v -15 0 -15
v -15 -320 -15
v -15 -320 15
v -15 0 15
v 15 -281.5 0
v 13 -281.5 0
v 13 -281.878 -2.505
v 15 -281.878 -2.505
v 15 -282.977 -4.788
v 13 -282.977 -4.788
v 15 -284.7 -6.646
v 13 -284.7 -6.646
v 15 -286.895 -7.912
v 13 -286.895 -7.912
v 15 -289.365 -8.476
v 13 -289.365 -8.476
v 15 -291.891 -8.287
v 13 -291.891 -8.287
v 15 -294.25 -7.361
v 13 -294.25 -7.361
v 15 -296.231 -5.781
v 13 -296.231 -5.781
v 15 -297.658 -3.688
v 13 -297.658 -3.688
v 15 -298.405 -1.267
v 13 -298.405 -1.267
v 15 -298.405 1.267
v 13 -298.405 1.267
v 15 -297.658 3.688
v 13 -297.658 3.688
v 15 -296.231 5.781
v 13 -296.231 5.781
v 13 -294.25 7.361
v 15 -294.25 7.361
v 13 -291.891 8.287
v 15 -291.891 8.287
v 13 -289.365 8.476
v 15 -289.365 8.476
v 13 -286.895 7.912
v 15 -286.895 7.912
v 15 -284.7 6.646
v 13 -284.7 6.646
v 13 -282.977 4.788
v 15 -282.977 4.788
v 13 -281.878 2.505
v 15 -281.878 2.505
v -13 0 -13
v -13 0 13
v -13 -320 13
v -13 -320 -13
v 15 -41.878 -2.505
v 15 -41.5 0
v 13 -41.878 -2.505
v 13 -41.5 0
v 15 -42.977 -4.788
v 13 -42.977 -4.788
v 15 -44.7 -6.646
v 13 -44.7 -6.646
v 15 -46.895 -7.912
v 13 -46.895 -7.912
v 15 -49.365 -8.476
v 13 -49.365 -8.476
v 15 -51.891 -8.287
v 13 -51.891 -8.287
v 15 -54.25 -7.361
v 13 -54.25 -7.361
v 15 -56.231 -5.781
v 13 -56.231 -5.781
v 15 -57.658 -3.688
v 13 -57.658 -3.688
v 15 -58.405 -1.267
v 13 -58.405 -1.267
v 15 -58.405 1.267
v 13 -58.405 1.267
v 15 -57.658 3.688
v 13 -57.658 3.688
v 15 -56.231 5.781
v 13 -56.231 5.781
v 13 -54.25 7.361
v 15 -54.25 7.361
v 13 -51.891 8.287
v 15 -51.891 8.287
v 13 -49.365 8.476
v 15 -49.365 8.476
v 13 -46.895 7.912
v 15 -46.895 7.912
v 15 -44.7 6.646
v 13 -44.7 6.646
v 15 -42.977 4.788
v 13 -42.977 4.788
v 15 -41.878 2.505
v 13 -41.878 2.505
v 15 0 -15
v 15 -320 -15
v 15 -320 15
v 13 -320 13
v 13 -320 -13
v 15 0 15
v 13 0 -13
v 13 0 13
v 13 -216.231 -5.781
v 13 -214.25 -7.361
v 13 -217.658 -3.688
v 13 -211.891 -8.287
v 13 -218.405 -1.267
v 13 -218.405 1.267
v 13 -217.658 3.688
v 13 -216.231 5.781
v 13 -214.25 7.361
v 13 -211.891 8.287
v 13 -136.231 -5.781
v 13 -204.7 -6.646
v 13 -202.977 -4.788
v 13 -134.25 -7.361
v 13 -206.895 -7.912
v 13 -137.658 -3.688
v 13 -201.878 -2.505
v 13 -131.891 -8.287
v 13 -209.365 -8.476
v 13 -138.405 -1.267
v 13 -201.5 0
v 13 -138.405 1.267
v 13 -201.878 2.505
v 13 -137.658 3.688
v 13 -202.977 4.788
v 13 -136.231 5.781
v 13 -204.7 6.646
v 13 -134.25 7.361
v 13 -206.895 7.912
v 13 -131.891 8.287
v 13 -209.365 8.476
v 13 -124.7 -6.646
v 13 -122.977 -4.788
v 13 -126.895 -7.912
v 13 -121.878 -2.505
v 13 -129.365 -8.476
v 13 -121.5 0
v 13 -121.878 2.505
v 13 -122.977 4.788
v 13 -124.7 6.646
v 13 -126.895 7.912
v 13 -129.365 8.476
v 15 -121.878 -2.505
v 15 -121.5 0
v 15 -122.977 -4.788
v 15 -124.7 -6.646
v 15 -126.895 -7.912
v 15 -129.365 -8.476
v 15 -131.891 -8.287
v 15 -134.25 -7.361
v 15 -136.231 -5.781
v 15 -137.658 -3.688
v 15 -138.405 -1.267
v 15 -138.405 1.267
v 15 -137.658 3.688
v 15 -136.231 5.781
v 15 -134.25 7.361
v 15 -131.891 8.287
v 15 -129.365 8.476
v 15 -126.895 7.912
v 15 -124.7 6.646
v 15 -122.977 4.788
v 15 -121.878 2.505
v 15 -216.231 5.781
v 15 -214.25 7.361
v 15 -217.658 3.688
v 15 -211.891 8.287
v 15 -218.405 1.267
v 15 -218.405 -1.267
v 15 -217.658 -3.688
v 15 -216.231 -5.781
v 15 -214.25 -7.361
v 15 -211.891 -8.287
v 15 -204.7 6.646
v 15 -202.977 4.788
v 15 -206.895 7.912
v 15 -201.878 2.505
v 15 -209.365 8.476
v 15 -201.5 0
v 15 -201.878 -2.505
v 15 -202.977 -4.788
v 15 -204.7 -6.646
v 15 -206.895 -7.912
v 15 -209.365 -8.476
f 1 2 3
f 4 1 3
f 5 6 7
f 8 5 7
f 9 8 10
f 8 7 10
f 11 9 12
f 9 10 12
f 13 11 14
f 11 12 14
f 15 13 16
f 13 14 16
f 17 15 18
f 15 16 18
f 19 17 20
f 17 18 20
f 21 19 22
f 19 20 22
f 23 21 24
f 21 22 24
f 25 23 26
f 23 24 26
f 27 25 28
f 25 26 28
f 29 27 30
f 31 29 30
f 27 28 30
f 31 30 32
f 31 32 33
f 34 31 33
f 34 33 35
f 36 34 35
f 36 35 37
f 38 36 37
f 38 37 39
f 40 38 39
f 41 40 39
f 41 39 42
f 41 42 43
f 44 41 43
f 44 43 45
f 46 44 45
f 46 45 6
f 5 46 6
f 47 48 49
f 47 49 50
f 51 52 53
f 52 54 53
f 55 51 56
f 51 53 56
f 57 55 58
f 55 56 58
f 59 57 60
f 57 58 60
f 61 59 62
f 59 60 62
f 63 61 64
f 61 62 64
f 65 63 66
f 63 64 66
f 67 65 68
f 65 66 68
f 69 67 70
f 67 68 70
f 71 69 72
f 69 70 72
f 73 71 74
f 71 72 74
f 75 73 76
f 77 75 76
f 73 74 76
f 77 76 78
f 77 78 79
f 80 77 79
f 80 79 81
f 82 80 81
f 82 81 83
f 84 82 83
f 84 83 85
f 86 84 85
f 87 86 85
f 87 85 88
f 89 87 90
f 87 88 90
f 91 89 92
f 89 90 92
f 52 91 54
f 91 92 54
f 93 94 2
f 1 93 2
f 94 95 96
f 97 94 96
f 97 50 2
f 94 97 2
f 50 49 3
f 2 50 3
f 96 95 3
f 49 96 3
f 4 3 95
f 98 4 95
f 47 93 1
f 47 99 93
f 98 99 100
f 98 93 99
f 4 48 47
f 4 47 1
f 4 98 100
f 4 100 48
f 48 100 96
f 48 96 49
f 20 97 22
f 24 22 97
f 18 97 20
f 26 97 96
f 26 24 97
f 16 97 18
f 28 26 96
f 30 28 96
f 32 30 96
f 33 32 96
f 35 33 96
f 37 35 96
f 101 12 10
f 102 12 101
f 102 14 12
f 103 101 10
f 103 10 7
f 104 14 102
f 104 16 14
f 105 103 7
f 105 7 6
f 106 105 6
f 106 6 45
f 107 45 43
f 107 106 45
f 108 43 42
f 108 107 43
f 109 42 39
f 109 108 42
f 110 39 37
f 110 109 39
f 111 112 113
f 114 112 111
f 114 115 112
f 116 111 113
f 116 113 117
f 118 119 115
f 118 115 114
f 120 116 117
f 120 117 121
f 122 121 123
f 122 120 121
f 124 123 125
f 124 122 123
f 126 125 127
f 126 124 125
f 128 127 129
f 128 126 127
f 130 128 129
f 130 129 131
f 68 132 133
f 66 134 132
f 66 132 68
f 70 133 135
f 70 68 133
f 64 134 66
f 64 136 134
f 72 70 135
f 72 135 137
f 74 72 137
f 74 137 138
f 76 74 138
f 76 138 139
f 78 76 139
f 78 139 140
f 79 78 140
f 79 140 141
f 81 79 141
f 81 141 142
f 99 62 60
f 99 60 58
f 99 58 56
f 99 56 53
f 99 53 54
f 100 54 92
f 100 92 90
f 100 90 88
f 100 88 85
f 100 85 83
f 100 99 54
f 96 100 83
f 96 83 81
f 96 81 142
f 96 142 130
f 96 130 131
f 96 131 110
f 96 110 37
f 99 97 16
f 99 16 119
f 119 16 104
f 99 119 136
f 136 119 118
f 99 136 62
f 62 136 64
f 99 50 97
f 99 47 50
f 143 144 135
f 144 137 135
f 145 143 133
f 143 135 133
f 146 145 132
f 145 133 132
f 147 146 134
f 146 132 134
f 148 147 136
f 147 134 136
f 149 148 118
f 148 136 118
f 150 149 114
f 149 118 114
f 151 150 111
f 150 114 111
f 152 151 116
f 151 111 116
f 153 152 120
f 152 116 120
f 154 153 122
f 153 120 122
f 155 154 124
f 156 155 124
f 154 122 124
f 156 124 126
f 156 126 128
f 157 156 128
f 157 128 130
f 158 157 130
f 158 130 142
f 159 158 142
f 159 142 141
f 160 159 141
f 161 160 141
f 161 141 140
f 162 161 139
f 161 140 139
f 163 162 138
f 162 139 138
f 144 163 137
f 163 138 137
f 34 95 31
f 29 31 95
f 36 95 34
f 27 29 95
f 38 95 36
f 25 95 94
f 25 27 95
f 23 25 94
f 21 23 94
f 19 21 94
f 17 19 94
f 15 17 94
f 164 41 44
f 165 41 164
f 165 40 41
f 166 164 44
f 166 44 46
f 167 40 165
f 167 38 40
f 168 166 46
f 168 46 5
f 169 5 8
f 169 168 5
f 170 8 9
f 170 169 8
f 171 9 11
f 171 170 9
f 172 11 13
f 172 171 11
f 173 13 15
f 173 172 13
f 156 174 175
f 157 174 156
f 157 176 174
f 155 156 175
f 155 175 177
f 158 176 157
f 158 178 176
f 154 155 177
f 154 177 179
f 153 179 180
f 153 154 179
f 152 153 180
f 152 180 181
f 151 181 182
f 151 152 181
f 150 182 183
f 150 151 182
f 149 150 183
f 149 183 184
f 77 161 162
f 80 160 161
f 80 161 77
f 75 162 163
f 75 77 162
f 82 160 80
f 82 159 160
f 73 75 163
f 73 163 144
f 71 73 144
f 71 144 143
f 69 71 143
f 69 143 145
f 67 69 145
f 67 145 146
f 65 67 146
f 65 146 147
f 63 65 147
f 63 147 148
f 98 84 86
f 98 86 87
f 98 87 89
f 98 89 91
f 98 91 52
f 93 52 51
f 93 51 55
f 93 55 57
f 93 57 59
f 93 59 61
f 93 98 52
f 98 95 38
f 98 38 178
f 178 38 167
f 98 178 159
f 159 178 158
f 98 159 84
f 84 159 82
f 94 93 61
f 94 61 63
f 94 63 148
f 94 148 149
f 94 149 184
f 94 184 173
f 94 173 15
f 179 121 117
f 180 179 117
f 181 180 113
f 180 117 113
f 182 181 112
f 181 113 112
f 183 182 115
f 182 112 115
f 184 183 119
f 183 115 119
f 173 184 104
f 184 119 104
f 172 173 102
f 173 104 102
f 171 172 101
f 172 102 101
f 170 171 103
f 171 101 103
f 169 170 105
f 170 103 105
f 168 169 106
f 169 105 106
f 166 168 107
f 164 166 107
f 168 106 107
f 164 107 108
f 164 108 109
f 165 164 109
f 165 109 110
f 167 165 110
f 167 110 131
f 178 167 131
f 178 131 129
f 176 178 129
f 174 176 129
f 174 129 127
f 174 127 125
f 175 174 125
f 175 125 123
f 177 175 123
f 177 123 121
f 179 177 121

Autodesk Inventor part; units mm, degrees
ref_plane "YZ Plane" through (0, 0, 0) normal (1, 0, 0) x (0, 1, 0)
ref_plane "XZ Plane" through (0, 0, 0) normal (0, 1, 0) x (-1, 0, 0)
ref_plane "XY Plane" through (0, 0, 0) normal (0, 0, 1) x (1, 0, 0)
sketch "Sketch9" plane through (0, 0, 0) normal (0, 1, 0) x (-1, 0, 0)
  line L0 (15, 15) -> (-15, 15)
  line L1 (-15, 15) -> (-15, -15)
  line L2 (-15, -15) -> (15, -15)
  line L3 (15, -15) -> (15, 15)
  line L4 (15, 15) -> (-15, -15) construction
  line L5 (-15, 15) -> (15, -15) construction
  line L6 (-13, 13) -> (13, 13)
  line L7 (13, 13) -> (13, -13)
  line L8 (13, -13) -> (-13, -13)
  line L9 (-13, -13) -> (-13, 13)
  point P0 (0, 0)
  dimension "d172" = 30
  dimension "d173" = 30
  dimension "d174" = 2
extrude "Extrusion3" add sketch "Sketch9" against normal blind 320
sketch "Sketch10" plane through (0, 0, 0) normal (1, 0, 0) x (0, 1, 0)
  line L0 (0, 15) -> (0, -15) construction
  line L1 (0, 15) -> (-320, 15) construction
  line L2 (0, -15) -> (-320, -15) construction
  line L3 (-58.5, 8.5) -> (-41.5, 8.5)
  line L4 (-41.5, 8.5) -> (-41.5, -8.5)
  line L5 (-41.5, -8.5) -> (-58.5, -8.5)
  line L6 (-58.5, -8.5) -> (-58.5, 8.5)
  line L7 (-58.5, 8.5) -> (-41.5, -8.5) construction
  line L8 (-41.5, 8.5) -> (-58.5, -8.5) construction
  line L9 (0, 0) -> (30, 0)
  circle A0 centre (-50, 0) radius 8.5
  dimension "d177" = 17
  dimension "d178" = 17
  dimension "d181" = 30
  dimension "d182" = 80
extrude "Extrusion4" cut sketch "Sketch10" along normal through all contours A0
pattern_linear "Rectangular Pattern4" count 4 spacing 80 along (0, -1, 0) of "Extrusion4"
properties part number "PRS 1200-52-02 FDS 1000 way tube 2" material "Stainless Steel"
